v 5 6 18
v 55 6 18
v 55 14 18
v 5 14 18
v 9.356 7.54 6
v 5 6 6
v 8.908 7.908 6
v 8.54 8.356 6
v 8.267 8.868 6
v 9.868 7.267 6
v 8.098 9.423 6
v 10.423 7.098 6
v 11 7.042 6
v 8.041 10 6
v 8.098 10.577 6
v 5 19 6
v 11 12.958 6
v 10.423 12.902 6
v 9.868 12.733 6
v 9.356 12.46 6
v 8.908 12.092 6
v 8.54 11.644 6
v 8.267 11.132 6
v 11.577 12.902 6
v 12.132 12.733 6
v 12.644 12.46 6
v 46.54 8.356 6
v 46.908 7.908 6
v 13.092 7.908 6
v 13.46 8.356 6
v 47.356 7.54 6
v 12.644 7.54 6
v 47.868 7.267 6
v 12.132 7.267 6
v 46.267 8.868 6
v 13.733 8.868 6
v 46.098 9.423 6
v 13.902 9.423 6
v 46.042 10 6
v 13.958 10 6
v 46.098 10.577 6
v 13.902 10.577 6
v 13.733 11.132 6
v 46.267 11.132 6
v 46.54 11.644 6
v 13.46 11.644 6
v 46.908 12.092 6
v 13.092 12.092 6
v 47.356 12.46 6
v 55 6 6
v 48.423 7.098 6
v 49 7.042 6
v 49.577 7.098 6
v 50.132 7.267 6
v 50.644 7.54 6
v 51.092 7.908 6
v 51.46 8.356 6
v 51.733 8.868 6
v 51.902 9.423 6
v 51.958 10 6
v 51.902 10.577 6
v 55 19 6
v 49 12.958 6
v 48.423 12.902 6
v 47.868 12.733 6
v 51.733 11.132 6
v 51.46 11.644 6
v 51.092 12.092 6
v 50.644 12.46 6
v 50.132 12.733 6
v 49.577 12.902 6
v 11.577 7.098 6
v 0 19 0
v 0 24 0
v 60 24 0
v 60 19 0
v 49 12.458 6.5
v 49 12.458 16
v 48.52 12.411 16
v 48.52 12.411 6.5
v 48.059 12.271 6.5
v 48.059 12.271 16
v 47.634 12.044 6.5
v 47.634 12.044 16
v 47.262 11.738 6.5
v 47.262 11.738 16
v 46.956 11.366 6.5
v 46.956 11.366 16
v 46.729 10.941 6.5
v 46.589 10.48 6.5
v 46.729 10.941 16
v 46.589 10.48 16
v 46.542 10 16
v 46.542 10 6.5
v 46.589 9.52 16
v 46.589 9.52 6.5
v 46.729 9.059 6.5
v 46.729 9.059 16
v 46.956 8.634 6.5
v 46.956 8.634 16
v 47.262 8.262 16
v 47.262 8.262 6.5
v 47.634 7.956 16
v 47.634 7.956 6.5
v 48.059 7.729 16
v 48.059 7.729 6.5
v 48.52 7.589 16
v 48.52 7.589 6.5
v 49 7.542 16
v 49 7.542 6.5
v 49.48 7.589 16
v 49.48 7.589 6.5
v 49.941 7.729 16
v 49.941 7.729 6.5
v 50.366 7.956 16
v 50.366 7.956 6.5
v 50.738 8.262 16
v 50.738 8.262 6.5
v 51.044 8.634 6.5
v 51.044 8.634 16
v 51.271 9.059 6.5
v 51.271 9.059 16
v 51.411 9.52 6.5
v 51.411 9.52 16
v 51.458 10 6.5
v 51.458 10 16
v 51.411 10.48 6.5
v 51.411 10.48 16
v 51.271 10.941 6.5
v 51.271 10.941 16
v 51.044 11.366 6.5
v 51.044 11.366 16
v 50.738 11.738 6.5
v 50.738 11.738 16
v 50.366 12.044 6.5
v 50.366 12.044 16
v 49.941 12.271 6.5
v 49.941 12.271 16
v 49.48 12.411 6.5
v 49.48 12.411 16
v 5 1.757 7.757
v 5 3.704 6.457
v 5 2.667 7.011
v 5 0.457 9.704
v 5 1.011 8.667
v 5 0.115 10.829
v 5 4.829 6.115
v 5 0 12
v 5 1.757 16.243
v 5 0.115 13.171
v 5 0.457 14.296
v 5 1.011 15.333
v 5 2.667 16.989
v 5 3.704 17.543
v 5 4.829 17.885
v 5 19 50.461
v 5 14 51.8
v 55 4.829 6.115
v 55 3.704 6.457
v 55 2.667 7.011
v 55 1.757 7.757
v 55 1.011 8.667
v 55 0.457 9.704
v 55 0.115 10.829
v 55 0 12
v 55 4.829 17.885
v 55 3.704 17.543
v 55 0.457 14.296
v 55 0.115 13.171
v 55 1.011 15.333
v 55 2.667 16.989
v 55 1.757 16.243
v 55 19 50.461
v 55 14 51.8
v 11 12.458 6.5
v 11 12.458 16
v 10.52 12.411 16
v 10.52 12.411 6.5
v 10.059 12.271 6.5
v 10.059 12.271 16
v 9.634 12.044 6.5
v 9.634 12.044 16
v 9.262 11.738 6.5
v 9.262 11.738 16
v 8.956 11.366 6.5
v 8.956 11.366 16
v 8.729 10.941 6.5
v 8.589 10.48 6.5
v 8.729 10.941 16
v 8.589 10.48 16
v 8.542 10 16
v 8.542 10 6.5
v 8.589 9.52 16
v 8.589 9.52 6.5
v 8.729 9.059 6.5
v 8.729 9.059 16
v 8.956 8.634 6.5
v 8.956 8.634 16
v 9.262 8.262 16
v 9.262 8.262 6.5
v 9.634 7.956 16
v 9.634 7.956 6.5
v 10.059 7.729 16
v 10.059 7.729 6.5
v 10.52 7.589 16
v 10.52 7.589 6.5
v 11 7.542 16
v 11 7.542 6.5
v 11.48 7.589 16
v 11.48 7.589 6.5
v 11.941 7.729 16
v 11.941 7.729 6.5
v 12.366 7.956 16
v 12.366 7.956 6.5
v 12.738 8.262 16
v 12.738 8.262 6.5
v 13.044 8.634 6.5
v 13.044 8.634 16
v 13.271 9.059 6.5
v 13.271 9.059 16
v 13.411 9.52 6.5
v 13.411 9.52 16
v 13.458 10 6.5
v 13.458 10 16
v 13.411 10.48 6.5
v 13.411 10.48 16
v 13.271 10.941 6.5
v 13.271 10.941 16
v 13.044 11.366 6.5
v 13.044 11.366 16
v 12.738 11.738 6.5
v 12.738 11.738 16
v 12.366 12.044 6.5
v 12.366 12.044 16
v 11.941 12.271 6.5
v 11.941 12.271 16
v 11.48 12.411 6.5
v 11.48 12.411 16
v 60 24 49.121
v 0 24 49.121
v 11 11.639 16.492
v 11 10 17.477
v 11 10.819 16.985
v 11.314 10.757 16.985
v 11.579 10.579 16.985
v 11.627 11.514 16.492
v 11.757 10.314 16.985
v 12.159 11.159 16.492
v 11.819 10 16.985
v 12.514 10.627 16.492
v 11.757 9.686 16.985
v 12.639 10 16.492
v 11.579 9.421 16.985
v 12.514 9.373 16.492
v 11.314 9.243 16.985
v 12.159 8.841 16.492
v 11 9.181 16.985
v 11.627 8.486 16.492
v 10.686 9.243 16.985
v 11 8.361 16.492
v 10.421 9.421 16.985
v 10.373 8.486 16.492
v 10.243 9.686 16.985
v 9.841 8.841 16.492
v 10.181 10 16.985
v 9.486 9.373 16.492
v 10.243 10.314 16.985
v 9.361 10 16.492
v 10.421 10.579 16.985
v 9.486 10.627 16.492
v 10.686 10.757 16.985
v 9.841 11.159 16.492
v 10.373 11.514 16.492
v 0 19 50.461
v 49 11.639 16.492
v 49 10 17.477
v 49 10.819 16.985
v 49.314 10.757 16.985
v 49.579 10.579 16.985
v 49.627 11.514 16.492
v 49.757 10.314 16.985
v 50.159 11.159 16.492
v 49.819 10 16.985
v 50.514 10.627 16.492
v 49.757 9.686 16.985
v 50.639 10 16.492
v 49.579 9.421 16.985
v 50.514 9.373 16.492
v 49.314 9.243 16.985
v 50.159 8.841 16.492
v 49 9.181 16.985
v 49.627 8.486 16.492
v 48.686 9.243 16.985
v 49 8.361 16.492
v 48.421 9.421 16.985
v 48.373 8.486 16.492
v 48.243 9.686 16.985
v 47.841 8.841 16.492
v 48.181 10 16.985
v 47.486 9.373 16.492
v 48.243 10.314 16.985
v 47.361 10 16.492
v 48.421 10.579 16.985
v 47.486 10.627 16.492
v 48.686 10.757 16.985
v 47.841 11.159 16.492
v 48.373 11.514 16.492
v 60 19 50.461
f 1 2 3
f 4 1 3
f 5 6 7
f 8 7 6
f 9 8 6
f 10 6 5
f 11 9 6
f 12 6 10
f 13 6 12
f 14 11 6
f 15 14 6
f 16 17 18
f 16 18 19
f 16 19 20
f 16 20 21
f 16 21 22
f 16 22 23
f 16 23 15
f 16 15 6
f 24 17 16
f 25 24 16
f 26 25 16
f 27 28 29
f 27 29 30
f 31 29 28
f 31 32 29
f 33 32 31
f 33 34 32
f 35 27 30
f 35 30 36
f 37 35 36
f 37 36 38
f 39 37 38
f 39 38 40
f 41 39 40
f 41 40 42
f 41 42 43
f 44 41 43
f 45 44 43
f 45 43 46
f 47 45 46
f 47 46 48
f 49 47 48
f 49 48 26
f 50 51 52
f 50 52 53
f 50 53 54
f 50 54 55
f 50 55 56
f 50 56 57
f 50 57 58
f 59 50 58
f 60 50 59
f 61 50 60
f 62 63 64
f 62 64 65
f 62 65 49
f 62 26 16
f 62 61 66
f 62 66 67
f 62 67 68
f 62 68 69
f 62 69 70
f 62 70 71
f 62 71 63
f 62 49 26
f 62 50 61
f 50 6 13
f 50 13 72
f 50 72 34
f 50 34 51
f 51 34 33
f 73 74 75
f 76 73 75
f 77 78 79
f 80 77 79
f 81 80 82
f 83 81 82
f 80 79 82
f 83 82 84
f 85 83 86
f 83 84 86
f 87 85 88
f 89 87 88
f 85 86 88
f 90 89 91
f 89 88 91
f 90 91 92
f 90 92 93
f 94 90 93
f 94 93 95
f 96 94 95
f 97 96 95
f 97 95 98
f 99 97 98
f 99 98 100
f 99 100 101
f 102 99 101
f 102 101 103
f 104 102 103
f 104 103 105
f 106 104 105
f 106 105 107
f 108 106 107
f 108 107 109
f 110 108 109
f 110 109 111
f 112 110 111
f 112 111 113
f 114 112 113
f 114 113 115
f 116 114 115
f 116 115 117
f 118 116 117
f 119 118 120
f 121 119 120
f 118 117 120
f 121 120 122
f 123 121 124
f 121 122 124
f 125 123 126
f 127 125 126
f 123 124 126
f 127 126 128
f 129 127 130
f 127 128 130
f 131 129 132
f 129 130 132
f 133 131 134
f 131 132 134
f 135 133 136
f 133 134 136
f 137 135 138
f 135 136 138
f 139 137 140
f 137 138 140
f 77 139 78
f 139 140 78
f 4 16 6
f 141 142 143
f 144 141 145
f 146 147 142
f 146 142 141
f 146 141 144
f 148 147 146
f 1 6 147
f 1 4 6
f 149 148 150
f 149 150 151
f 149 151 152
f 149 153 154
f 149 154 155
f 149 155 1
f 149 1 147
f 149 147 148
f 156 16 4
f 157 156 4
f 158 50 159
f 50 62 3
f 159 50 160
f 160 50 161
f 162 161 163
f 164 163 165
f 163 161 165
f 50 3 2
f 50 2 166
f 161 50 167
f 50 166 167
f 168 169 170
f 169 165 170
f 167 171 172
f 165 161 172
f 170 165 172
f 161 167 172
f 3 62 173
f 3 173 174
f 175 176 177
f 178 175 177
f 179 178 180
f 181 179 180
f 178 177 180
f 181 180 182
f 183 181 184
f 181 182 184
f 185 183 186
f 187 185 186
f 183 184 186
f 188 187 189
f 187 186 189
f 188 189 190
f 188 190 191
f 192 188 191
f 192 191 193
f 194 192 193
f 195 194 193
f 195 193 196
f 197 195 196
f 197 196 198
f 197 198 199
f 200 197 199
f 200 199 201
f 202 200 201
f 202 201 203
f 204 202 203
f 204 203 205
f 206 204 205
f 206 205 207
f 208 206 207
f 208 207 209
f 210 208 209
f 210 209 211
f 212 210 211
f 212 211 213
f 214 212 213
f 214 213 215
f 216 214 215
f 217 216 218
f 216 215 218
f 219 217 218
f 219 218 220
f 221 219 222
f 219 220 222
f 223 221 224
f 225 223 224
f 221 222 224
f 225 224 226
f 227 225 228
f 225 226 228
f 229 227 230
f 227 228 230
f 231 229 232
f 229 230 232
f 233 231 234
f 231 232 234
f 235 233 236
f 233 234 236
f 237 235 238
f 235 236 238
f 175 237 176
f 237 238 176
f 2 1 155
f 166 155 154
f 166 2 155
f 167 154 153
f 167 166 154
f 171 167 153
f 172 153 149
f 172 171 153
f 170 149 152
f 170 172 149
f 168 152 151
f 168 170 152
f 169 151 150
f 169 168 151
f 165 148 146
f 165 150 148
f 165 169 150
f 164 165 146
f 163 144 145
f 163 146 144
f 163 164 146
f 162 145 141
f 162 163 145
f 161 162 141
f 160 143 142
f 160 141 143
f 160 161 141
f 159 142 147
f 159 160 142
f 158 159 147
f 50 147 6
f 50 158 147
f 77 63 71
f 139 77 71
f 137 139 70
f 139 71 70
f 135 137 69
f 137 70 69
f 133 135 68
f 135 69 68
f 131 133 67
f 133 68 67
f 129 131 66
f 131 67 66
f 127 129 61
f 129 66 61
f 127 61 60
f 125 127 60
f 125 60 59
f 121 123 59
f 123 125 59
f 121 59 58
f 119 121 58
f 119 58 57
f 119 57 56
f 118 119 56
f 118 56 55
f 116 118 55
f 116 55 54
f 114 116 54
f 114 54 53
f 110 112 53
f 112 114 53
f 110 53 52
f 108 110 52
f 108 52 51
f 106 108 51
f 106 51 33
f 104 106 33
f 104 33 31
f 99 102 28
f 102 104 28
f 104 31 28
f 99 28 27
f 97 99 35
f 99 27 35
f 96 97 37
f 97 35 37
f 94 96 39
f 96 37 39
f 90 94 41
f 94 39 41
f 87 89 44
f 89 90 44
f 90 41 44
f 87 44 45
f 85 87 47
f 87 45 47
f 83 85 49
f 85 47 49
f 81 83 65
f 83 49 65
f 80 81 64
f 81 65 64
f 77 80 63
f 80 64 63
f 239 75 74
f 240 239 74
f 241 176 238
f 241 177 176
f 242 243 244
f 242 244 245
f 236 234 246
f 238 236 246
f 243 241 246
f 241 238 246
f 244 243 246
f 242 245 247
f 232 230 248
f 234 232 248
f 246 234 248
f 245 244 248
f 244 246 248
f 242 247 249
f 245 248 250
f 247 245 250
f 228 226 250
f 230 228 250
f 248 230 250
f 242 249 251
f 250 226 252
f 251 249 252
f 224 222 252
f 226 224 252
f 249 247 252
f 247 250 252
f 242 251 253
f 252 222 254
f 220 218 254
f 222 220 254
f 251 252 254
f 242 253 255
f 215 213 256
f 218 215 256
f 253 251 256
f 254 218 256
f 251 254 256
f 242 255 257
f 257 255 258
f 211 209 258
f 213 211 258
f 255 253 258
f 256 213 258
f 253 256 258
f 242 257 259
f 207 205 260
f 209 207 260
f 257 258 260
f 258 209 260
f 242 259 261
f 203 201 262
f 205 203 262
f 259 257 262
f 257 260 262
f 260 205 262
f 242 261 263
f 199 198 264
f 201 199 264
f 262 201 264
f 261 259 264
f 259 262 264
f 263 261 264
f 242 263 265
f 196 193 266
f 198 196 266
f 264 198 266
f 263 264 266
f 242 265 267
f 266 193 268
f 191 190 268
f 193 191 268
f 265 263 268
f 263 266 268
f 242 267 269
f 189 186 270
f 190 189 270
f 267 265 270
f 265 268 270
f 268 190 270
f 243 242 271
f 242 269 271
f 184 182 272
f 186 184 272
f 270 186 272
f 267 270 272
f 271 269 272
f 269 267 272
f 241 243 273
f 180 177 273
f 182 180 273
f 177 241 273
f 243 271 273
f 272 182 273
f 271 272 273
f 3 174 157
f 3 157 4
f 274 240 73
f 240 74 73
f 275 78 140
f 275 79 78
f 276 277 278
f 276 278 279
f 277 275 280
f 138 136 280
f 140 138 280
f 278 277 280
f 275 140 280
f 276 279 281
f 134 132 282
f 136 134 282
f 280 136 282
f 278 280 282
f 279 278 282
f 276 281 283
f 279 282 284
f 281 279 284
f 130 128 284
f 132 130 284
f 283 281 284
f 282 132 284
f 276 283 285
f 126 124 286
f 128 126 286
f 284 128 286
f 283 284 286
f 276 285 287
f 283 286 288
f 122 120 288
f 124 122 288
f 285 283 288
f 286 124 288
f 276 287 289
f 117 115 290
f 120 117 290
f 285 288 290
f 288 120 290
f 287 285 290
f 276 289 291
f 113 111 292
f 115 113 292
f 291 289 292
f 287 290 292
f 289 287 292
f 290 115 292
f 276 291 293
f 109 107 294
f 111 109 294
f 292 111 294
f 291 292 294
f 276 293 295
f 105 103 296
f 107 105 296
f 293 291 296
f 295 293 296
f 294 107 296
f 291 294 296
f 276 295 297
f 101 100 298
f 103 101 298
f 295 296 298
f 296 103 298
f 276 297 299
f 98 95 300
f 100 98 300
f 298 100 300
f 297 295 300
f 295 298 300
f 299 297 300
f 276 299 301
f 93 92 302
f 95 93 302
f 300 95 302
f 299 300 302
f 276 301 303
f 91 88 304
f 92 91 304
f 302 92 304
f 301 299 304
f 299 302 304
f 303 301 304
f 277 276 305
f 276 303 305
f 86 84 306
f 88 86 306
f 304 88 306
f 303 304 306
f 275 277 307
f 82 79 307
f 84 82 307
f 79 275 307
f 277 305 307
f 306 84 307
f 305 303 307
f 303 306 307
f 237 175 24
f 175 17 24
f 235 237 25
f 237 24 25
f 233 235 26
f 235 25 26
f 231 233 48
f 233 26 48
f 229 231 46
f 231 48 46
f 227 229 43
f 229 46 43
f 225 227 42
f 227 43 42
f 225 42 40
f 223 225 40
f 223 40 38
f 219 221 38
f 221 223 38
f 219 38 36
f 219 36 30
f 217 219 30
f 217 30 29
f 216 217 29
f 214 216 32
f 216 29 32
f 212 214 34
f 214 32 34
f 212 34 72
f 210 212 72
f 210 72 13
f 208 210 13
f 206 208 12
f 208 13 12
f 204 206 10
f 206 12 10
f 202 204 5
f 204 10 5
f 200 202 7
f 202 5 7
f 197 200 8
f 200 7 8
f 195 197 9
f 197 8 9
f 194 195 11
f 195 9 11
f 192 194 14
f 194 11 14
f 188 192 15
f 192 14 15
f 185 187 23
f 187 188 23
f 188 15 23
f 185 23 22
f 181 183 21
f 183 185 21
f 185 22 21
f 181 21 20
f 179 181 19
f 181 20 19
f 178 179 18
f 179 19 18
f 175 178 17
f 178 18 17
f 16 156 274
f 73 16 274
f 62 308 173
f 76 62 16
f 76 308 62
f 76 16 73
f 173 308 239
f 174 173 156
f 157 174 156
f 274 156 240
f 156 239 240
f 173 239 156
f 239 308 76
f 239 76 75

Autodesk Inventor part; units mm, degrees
ref_plane "YZ Plane" through (0, 0, 0) normal (1, 0, 0) x (0, 1, 0)
ref_plane "XZ Plane" through (0, 0, 0) normal (0, 1, 0) x (-1, 0, 0)
ref_plane "XY Plane" through (0, 0, 0) normal (0, 0, 1) x (1, 0, 0)
sketch "Sketch1" plane through (0, 0, 0) normal (0, 0, 1) x (1, 0, 0)
  line L0 (0, 0) -> (60, 0)
  line L1 (60, 0) -> (60, 24)
  line L2 (60, 24) -> (0, 24)
  line L3 (0, 24) -> (0, 0)
  dimension "d0" = 60
  dimension "d1" = 24
extrude "Extrusion1" add sketch "Sketch1" along normal blind 51.8
sketch "Sketch2" plane through (60, 0, 0) normal (1, 0, 0) x (0, 0, -1)
  line L0 (-51.8, 24) -> (-51.8, 0) projected
  line L1 (0, 0) -> (-51.8, 0) projected
  line L2 (0, 0) -> (0, 24) projected
  line L3 (0, 24) -> (-51.8, 24) projected
  line L4 (-51.8, 14) -> (-18, 14)
  arc A0 (-18, 6) -> (-6, 6) centre (-12, 6) ccw
  line L5 (-18, 6) -> (-18, 14)
  line L6 (-6, 6) -> (-6, 19)
  line L7 (-6, 19) -> (0, 19)
  dimension "d5" = 10
  dimension "d6" = 18
  dimension "d7" = 12
  dimension "d8" = 5
  dimension "d9" = 6
extrude "Extrusion2" cut sketch "Sketch2" against normal blind 60 contours L4 L5 A0 L1 L0 | L2 L1 A0 L6 L7
sketch "Sketch3" plane through (0, 0, 51.8) normal (0, 0, 1) x (1, 0, 0)
  line L0 (60, 0) -> (0, 0) projected
  line L1 (55, 19) -> (55, 0)
  line L2 (55, 0) -> (60, 0)
  line L3 (60, 0) -> (60, 19)
  line L4 (5, 19) -> (5, 0)
  line L5 (5, 0) -> (0, 0)
  line L6 (0, 0) -> (0, 19)
  line L7 (60, 19) -> (0, 19) projected
  line L8 (0, 24) -> (60, 24) projected
  line L9 (0, 0) -> (0, 24) projected
  line L10 (60, 24) -> (60, 0) projected
  line L11 (0, 19) -> (5, 19)
  line L12 (55, 19) -> (60, 19)
  point P0 (0, 14)
  point P1 (60, 14)
  dimension "d16" = 5
  dimension "d17" = 5
extrude "Extrusion3" cut sketch "Sketch3" against normal blind 52 contours L0 L1 L7 L3 | L0 L6 L7 L4
chamfer "Chamfer1" distance 10 angle 15 1 edges at (30, 24, 51.8) measured on face at (21.6667, 22.3333, 51.8)
sketch "Sketch5" plane through (55, 19, 6) normal (0, 0, -1) x (-1, 0, 0)
  line L0 (0, 0) -> (0, -13) projected
  line L1 (-5, 5) -> (55, 5) projected
  point P0 (55, -19)
  point P1 (6, -9)
  point P2 (44, -9)
  dimension "d35" = 38
  dimension "d36" = 6
  dimension "d37" = 14
  dimension "d38" = 14
hole "Hole2" at (49, 10, 6) at (11, 10, 6) direction (0, 0, 1) diameter 4.917 depth 10 tip angle 118 thread size "M6x1" class "6H" standard "ANSI Metric M Profile"
chamfer "Chamfer2" distance 0.5 angle 45 2 edges at (11, 7.5415, 6) (49, 7.5415, 6)
properties part number "TETO DA CABINE(15)" material "Carbon Steel"
